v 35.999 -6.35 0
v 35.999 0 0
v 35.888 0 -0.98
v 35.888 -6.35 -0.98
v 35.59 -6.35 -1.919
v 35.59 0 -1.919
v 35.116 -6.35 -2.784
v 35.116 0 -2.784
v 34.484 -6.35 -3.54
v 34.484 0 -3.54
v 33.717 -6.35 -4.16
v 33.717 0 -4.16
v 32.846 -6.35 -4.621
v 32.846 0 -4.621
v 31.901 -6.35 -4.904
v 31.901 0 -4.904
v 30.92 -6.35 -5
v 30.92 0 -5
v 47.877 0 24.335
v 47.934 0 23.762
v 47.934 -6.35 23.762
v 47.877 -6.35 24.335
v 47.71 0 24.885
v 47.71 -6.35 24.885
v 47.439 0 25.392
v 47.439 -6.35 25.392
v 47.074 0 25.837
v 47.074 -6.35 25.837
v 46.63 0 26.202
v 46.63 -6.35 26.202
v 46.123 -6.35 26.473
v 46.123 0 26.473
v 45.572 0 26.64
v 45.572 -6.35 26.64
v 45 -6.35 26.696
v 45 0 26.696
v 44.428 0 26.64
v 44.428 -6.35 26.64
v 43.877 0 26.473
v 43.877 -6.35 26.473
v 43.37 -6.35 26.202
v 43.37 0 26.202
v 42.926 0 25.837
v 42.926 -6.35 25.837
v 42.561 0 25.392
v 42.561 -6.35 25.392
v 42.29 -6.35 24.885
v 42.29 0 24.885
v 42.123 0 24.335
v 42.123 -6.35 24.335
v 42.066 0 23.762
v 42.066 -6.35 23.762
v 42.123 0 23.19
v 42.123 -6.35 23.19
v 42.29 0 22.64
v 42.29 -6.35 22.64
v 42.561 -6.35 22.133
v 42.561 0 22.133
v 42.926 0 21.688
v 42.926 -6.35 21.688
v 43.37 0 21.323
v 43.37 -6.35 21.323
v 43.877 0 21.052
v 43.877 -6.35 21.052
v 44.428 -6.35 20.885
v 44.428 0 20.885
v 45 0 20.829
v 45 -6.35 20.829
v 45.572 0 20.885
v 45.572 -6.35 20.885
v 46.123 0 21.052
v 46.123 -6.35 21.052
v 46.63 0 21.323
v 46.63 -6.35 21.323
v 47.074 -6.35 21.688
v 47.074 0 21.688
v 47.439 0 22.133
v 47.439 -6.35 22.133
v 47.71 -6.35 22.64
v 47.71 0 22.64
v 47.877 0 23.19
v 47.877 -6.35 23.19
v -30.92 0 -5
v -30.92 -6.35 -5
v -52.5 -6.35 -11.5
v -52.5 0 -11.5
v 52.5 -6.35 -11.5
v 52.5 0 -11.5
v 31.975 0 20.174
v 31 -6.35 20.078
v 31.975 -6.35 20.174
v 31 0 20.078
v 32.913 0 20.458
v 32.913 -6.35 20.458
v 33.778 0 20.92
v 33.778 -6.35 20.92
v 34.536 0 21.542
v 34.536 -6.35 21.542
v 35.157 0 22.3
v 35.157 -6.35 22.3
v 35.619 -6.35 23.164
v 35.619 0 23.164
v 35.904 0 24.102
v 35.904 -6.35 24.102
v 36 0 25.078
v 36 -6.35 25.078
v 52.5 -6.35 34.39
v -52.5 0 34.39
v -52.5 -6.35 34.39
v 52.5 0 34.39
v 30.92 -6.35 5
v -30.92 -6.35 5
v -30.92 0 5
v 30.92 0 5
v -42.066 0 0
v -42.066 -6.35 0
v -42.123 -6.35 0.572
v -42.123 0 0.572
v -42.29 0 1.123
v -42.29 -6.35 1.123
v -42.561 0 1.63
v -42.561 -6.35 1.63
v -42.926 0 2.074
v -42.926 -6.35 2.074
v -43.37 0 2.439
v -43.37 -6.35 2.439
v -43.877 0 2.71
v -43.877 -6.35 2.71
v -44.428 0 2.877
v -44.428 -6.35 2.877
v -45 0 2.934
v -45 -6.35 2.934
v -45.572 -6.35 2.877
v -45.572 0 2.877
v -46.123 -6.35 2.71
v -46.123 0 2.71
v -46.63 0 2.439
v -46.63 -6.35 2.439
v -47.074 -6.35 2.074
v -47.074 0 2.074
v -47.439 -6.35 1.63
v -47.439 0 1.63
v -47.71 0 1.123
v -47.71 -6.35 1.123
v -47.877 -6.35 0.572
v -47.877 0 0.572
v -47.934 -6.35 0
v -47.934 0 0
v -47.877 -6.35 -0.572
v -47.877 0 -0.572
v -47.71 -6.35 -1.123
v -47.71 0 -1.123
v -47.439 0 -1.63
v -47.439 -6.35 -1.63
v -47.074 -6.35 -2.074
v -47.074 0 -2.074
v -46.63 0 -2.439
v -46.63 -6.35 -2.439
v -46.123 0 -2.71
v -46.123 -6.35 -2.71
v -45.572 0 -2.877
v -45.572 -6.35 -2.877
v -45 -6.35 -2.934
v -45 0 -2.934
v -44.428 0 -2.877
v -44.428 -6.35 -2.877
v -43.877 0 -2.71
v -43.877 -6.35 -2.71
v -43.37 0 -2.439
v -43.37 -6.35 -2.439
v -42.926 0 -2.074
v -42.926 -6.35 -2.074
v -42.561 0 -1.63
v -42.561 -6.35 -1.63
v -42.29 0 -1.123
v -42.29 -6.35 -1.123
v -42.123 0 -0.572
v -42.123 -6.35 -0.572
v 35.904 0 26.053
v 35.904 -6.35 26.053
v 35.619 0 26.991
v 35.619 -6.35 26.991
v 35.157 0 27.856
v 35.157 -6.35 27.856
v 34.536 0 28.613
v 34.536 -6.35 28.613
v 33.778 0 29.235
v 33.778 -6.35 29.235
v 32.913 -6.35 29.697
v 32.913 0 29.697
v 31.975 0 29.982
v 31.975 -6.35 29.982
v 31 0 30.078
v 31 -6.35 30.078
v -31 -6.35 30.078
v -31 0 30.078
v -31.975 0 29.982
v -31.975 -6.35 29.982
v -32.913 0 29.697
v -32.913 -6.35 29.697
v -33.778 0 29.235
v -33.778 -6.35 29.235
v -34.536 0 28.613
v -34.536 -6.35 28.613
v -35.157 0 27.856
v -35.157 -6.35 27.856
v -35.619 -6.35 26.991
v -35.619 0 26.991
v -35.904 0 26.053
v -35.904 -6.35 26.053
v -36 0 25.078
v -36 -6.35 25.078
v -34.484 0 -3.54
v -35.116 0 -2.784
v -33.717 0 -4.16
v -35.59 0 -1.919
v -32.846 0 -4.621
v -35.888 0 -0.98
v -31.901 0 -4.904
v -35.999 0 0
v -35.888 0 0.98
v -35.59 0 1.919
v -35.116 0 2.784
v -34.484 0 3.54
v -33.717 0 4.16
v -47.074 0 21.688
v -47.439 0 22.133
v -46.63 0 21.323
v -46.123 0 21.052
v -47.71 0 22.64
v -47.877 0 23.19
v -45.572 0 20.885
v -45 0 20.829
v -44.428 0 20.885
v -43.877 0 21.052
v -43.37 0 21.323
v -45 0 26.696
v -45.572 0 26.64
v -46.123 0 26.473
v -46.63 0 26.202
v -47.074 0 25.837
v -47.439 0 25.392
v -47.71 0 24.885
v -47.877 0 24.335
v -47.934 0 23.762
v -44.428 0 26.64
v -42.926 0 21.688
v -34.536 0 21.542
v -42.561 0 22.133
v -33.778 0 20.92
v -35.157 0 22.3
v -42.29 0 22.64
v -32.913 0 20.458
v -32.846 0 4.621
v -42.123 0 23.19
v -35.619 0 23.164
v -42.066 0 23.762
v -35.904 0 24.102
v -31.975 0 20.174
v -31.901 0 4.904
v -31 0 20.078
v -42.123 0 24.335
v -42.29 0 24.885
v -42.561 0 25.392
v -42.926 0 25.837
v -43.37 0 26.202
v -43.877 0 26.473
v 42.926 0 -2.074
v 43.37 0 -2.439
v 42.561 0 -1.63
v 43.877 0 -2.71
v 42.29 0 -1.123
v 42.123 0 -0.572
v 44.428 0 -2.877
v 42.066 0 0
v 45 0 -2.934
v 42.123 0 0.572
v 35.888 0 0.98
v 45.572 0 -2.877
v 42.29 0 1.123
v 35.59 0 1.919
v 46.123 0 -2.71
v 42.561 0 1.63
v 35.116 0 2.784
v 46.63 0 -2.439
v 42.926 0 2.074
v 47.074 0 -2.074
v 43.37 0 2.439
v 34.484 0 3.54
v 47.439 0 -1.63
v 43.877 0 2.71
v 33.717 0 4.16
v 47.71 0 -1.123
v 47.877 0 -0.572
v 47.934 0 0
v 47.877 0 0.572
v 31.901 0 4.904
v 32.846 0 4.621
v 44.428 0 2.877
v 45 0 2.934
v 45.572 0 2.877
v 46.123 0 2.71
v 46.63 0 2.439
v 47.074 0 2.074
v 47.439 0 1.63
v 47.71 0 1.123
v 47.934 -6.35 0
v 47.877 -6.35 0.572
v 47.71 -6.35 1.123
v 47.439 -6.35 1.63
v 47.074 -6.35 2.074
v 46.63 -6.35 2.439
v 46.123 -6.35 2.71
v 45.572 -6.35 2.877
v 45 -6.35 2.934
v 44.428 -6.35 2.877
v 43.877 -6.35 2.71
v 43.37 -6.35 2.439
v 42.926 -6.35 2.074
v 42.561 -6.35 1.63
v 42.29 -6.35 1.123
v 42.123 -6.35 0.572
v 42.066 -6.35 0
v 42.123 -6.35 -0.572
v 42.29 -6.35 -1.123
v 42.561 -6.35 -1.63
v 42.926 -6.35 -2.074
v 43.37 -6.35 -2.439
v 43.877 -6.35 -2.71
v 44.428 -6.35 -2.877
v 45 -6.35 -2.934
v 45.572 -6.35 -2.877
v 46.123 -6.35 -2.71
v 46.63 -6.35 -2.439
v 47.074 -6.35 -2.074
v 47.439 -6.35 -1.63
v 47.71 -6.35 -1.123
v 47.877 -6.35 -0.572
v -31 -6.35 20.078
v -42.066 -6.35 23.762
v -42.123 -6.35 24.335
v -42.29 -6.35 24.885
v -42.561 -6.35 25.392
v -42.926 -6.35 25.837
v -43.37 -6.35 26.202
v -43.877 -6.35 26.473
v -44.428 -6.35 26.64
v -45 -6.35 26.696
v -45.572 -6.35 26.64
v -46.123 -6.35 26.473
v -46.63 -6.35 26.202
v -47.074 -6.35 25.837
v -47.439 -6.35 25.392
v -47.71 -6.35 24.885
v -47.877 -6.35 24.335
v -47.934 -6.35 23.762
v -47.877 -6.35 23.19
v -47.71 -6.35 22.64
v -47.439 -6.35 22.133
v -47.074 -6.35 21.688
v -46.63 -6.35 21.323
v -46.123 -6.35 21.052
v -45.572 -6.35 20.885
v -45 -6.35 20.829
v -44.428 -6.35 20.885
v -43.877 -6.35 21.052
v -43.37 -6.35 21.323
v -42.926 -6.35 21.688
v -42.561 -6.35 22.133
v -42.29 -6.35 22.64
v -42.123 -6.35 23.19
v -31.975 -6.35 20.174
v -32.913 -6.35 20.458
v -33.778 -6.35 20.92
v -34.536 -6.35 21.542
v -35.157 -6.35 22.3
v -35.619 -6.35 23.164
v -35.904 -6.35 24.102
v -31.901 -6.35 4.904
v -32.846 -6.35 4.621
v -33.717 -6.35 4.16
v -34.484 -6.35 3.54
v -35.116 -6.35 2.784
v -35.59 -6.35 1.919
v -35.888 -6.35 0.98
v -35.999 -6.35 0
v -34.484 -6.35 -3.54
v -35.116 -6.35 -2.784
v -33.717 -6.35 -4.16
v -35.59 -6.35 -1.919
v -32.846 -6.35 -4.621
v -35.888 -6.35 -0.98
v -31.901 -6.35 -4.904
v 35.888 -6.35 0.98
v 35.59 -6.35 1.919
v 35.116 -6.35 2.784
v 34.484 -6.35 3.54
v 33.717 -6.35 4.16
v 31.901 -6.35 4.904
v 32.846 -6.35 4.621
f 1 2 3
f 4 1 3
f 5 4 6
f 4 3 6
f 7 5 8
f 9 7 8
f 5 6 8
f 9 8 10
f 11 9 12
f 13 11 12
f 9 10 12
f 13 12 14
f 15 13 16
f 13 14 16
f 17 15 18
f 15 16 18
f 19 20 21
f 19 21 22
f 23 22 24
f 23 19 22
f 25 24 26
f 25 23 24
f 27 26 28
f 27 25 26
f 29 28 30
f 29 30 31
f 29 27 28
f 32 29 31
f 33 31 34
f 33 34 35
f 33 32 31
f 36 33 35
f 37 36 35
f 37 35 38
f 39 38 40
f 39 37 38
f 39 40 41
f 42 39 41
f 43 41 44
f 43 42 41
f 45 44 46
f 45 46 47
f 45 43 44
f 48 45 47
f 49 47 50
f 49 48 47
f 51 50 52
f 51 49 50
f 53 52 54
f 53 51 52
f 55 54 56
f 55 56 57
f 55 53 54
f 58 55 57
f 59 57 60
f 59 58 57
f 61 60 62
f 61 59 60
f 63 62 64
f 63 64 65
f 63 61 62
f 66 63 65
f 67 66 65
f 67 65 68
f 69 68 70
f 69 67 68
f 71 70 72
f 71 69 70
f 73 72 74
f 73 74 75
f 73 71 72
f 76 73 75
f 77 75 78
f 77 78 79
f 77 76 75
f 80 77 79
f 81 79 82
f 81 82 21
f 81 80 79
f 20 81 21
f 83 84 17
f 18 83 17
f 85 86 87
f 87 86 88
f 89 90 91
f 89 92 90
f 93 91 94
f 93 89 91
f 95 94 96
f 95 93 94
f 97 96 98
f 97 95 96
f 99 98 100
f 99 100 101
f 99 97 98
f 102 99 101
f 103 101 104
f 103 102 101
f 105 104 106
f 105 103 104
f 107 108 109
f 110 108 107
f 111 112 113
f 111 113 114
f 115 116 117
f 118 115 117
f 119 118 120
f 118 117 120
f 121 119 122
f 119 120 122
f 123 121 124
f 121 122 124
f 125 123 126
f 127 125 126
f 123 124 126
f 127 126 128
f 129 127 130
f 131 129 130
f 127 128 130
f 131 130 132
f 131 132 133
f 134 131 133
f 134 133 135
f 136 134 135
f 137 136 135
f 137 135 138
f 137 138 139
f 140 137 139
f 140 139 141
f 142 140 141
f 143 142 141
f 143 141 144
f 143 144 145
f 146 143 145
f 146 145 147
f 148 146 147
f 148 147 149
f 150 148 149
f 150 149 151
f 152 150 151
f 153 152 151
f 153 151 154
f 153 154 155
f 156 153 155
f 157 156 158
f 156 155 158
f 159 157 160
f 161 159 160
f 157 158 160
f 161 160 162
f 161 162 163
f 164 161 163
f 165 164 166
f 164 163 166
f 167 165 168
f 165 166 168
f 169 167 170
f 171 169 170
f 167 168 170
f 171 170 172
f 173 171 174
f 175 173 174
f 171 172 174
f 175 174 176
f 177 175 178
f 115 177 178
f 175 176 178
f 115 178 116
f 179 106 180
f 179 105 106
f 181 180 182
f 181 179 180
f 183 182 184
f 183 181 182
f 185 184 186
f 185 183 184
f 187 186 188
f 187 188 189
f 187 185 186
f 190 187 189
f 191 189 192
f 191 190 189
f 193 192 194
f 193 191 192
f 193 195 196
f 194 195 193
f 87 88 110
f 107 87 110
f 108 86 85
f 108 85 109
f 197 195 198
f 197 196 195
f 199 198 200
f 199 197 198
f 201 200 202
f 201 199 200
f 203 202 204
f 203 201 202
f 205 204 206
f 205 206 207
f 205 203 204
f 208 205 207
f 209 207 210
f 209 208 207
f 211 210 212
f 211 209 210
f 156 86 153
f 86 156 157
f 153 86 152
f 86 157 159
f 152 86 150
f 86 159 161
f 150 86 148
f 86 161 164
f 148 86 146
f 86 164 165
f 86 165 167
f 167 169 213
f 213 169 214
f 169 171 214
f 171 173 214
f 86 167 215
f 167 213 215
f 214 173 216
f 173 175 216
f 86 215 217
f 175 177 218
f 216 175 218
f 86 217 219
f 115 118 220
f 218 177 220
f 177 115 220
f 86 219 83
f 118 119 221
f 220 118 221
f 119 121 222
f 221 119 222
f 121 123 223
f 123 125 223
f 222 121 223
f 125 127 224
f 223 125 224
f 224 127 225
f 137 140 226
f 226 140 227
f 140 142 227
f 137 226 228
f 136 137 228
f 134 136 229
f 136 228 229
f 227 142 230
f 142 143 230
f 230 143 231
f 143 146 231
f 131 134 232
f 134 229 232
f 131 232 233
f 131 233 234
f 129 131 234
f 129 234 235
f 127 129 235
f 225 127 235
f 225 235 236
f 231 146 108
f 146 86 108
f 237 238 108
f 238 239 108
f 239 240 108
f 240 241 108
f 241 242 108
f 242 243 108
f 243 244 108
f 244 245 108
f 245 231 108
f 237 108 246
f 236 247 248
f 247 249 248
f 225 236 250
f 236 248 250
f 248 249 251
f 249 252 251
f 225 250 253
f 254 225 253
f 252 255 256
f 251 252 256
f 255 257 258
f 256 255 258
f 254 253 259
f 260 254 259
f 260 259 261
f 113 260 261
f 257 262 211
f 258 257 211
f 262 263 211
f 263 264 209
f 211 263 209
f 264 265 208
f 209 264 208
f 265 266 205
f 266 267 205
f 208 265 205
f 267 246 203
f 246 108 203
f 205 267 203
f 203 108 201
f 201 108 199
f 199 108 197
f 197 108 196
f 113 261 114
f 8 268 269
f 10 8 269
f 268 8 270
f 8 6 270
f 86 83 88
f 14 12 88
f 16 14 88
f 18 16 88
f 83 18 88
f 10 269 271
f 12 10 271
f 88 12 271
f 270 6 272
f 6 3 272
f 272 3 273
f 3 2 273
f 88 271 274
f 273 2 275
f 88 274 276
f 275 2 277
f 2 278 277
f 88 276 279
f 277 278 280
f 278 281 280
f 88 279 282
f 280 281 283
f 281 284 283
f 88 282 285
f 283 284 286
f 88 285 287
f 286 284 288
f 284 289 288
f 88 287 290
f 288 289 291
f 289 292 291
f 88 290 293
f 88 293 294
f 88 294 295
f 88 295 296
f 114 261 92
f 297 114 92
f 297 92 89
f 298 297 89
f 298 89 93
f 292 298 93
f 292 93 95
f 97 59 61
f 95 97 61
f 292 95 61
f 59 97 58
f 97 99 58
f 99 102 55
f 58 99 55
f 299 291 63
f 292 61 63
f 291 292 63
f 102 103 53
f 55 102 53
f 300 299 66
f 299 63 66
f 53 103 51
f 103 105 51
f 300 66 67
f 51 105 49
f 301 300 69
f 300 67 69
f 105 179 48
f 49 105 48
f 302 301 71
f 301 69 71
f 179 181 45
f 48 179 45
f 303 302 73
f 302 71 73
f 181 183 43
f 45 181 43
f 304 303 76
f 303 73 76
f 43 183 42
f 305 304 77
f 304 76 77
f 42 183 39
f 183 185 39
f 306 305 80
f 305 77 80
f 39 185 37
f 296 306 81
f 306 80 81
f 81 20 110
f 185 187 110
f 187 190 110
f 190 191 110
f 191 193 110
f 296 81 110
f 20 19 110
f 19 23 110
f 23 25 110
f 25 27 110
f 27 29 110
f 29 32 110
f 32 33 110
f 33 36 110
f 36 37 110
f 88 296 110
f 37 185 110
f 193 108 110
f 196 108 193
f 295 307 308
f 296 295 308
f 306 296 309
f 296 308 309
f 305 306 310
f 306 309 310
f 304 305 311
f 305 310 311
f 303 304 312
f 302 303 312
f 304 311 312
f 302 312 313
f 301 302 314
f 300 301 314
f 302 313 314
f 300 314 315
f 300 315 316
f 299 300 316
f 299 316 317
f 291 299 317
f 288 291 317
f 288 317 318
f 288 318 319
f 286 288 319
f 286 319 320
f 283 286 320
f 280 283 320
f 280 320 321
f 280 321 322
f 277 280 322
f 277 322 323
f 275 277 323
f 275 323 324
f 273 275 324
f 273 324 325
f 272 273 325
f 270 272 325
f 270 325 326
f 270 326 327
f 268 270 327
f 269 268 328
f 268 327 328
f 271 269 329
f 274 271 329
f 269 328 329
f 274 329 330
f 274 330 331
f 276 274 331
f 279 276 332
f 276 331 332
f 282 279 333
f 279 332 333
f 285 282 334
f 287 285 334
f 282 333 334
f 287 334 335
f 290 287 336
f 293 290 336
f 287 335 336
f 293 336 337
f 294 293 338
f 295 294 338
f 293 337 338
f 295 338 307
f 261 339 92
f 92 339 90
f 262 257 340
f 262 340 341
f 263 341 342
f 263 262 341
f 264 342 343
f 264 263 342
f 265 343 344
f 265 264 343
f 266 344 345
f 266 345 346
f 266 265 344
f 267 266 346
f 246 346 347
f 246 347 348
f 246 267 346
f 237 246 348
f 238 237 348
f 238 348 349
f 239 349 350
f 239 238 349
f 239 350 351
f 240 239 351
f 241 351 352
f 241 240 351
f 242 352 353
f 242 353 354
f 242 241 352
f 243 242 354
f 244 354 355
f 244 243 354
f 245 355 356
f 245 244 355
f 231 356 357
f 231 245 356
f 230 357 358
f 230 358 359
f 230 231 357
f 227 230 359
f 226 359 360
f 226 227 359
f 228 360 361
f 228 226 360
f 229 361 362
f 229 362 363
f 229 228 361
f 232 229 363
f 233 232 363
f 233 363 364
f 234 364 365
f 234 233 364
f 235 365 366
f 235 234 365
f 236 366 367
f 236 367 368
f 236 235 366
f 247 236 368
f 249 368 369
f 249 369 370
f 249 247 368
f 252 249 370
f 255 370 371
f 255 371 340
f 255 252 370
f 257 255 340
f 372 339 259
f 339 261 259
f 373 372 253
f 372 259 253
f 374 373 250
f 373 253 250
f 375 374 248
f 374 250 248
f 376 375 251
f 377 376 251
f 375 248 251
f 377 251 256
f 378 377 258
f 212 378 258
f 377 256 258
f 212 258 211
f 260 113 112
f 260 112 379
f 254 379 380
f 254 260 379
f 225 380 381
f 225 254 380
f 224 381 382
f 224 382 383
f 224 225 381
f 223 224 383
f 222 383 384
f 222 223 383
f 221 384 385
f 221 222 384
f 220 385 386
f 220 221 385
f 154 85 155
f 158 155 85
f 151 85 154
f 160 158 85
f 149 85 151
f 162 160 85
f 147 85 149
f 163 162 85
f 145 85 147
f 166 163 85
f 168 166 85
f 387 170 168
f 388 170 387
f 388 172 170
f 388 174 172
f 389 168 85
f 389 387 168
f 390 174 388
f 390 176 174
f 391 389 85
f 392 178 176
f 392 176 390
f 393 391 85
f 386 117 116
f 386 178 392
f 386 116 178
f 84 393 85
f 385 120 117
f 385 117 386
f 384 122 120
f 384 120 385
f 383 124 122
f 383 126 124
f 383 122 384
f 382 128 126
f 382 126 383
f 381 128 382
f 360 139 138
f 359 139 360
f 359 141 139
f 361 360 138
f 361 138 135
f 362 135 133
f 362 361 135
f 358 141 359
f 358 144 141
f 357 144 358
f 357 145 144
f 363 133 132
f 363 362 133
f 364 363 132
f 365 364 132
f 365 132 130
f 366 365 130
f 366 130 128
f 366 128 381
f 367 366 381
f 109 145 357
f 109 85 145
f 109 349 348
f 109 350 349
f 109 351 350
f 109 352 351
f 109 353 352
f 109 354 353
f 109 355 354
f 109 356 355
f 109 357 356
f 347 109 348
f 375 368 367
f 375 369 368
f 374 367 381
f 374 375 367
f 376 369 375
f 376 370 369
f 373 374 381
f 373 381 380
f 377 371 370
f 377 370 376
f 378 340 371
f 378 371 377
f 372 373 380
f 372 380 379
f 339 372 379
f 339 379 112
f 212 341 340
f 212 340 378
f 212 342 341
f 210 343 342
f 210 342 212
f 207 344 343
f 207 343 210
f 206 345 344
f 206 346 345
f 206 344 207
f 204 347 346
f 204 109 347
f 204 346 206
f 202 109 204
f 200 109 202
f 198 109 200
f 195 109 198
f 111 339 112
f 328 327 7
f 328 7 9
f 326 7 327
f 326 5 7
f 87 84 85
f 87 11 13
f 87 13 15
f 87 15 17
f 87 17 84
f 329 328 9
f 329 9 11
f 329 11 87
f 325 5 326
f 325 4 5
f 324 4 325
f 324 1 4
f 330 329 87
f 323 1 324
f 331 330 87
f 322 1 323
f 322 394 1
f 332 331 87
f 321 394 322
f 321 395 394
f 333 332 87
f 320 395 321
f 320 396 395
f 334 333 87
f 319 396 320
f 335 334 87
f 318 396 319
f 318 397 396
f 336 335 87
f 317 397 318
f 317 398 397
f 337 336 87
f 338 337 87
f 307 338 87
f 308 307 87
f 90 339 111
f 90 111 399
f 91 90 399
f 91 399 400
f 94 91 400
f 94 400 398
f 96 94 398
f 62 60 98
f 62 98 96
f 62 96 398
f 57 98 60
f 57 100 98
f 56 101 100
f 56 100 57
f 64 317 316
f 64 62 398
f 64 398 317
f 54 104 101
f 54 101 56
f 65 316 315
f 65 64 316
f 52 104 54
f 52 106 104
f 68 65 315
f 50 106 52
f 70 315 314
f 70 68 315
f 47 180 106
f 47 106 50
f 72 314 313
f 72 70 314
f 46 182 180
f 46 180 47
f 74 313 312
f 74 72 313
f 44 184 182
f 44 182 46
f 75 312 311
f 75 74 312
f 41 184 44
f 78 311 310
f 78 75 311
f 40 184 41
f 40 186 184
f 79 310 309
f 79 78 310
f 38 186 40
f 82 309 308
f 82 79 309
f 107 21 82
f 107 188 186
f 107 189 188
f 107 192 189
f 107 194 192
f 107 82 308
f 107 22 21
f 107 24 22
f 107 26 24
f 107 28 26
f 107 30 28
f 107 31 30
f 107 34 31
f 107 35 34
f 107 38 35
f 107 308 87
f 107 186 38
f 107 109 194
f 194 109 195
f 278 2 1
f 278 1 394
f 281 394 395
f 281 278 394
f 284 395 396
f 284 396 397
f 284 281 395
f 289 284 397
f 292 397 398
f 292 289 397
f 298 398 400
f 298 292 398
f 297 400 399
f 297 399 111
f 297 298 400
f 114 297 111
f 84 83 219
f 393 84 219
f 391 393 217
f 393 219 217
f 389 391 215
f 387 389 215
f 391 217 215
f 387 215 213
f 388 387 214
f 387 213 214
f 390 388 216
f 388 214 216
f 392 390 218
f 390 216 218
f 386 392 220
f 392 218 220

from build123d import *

# Parameters (mm, degrees)
F0_W        = 105
F0_H        = 23
F1_DEPTH    = 6.35
F2_W        = 72
F2_H        = 10
F3_DEPTH    = 25.4
F4_R        = 2.9337
F5_DEPTH    = 25.4
F6_T1_DEPTH = 6.35
F7_W        = 105
F7_H        = 23
F7_R        = 2.9335
F8_DEPTH    = 6.35
F9_W        = 72
F9_H        = 10
F10_DEPTH   = 25
F11_R       = 4.99999


# Not quite as in the source:
# - a fillet or chamfer that OpenCascade refuses, or shapes differently, is made with other operations: its cross-section is extruded or revolved along the edge and cut away or added
# - a fillet or chamfer is up to 0.001 mm smaller than in the source, because OpenCascade refuses the exact size


with BuildPart() as f1:
    # F0 (on Front) → F1 (new body)
    with BuildSketch(Plane.XZ):
        Rectangle(F0_W, F0_H)
    extrude(amount=F1_DEPTH)

    # F2 (on face) → F3 (cut)
    with BuildSketch(Plane.XZ.offset(6.35)):
        Rectangle(F2_W, F2_H)
    extrude(amount=-F3_DEPTH, mode=Mode.SUBTRACT)

    # F4 (on face) → F5 (cut)
    with BuildSketch(Plane.XZ.offset(6.35)):
        with Locations((-45, 0)):
            Circle(F4_R)
        with Locations((45, 0)):
            Circle(F4_R)
    extrude(amount=-F5_DEPTH, mode=Mode.SUBTRACT)

    # F6: fillet of radius 5.08 on 4 edges, made by hand

    # F6_s2 → F6_t1 (join)
    with BuildSketch(Plane.XZ):
        with BuildLine():
            ThreePointArc((36, 0.08), (34.5121024484, -3.5121024484), (30.92, -5))
            Line((30.92, -5), (36, -5))
            Line((36, -5), (36, 0.08))
        make_face()
        with BuildLine():
            ThreePointArc((-30.92, 5), (-34.5121024484, 3.5121024484), (-36, -0.08))
            Line((-36, -0.08), (-36, 5))
            Line((-36, 5), (-30.92, 5))
        make_face()
        with BuildLine():
            ThreePointArc((-30.92, -5), (-34.5121024484, -3.5121024484), (-36, 0.08))
            Line((-36, 0.08), (-36, -5))
            Line((-36, -5), (-30.92, -5))
        make_face()
        with BuildLine():
            ThreePointArc((36, -0.08), (34.5121024484, 3.5121024484), (30.92, 5))
            Line((30.92, 5), (36, 5))
            Line((36, 5), (36, -0.08))
        make_face()
    extrude(amount=F6_T1_DEPTH)

    # F7 (on Front) → F8 (join)
    with BuildSketch(Plane.XZ):
        with Locations((0, 22.8902743906)):
            Rectangle(F7_W, F7_H)
        with Locations((-45, 23.7624682486)):
            Circle(F7_R, mode=Mode.SUBTRACT)
        with Locations((45, 23.7624682486)):
            Circle(F7_R, mode=Mode.SUBTRACT)
    extrude(amount=F8_DEPTH)

    # F9 (on face) → F10 (cut)
    with BuildSketch(Plane.XZ.offset(6.35)):
        with Locations((0, 25.0778379703)):
            Rectangle(F9_W, F9_H)
    extrude(amount=-F10_DEPTH, mode=Mode.SUBTRACT)

    # F11 (radius 5 in the source; OpenCascade refuses exactly that, so slightly less here)
    f11_edges = [f1.edges().sort_by_distance(p)[0] for p in [
        (-36, -3.175, 20.077838),
        (36, -3.175, 20.077838),
        (36, -3.175, 30.077838),
        (-36, -3.175, 30.077838),
    ]]
    fillet(f11_edges, radius=F11_R)


solid = f1.part
